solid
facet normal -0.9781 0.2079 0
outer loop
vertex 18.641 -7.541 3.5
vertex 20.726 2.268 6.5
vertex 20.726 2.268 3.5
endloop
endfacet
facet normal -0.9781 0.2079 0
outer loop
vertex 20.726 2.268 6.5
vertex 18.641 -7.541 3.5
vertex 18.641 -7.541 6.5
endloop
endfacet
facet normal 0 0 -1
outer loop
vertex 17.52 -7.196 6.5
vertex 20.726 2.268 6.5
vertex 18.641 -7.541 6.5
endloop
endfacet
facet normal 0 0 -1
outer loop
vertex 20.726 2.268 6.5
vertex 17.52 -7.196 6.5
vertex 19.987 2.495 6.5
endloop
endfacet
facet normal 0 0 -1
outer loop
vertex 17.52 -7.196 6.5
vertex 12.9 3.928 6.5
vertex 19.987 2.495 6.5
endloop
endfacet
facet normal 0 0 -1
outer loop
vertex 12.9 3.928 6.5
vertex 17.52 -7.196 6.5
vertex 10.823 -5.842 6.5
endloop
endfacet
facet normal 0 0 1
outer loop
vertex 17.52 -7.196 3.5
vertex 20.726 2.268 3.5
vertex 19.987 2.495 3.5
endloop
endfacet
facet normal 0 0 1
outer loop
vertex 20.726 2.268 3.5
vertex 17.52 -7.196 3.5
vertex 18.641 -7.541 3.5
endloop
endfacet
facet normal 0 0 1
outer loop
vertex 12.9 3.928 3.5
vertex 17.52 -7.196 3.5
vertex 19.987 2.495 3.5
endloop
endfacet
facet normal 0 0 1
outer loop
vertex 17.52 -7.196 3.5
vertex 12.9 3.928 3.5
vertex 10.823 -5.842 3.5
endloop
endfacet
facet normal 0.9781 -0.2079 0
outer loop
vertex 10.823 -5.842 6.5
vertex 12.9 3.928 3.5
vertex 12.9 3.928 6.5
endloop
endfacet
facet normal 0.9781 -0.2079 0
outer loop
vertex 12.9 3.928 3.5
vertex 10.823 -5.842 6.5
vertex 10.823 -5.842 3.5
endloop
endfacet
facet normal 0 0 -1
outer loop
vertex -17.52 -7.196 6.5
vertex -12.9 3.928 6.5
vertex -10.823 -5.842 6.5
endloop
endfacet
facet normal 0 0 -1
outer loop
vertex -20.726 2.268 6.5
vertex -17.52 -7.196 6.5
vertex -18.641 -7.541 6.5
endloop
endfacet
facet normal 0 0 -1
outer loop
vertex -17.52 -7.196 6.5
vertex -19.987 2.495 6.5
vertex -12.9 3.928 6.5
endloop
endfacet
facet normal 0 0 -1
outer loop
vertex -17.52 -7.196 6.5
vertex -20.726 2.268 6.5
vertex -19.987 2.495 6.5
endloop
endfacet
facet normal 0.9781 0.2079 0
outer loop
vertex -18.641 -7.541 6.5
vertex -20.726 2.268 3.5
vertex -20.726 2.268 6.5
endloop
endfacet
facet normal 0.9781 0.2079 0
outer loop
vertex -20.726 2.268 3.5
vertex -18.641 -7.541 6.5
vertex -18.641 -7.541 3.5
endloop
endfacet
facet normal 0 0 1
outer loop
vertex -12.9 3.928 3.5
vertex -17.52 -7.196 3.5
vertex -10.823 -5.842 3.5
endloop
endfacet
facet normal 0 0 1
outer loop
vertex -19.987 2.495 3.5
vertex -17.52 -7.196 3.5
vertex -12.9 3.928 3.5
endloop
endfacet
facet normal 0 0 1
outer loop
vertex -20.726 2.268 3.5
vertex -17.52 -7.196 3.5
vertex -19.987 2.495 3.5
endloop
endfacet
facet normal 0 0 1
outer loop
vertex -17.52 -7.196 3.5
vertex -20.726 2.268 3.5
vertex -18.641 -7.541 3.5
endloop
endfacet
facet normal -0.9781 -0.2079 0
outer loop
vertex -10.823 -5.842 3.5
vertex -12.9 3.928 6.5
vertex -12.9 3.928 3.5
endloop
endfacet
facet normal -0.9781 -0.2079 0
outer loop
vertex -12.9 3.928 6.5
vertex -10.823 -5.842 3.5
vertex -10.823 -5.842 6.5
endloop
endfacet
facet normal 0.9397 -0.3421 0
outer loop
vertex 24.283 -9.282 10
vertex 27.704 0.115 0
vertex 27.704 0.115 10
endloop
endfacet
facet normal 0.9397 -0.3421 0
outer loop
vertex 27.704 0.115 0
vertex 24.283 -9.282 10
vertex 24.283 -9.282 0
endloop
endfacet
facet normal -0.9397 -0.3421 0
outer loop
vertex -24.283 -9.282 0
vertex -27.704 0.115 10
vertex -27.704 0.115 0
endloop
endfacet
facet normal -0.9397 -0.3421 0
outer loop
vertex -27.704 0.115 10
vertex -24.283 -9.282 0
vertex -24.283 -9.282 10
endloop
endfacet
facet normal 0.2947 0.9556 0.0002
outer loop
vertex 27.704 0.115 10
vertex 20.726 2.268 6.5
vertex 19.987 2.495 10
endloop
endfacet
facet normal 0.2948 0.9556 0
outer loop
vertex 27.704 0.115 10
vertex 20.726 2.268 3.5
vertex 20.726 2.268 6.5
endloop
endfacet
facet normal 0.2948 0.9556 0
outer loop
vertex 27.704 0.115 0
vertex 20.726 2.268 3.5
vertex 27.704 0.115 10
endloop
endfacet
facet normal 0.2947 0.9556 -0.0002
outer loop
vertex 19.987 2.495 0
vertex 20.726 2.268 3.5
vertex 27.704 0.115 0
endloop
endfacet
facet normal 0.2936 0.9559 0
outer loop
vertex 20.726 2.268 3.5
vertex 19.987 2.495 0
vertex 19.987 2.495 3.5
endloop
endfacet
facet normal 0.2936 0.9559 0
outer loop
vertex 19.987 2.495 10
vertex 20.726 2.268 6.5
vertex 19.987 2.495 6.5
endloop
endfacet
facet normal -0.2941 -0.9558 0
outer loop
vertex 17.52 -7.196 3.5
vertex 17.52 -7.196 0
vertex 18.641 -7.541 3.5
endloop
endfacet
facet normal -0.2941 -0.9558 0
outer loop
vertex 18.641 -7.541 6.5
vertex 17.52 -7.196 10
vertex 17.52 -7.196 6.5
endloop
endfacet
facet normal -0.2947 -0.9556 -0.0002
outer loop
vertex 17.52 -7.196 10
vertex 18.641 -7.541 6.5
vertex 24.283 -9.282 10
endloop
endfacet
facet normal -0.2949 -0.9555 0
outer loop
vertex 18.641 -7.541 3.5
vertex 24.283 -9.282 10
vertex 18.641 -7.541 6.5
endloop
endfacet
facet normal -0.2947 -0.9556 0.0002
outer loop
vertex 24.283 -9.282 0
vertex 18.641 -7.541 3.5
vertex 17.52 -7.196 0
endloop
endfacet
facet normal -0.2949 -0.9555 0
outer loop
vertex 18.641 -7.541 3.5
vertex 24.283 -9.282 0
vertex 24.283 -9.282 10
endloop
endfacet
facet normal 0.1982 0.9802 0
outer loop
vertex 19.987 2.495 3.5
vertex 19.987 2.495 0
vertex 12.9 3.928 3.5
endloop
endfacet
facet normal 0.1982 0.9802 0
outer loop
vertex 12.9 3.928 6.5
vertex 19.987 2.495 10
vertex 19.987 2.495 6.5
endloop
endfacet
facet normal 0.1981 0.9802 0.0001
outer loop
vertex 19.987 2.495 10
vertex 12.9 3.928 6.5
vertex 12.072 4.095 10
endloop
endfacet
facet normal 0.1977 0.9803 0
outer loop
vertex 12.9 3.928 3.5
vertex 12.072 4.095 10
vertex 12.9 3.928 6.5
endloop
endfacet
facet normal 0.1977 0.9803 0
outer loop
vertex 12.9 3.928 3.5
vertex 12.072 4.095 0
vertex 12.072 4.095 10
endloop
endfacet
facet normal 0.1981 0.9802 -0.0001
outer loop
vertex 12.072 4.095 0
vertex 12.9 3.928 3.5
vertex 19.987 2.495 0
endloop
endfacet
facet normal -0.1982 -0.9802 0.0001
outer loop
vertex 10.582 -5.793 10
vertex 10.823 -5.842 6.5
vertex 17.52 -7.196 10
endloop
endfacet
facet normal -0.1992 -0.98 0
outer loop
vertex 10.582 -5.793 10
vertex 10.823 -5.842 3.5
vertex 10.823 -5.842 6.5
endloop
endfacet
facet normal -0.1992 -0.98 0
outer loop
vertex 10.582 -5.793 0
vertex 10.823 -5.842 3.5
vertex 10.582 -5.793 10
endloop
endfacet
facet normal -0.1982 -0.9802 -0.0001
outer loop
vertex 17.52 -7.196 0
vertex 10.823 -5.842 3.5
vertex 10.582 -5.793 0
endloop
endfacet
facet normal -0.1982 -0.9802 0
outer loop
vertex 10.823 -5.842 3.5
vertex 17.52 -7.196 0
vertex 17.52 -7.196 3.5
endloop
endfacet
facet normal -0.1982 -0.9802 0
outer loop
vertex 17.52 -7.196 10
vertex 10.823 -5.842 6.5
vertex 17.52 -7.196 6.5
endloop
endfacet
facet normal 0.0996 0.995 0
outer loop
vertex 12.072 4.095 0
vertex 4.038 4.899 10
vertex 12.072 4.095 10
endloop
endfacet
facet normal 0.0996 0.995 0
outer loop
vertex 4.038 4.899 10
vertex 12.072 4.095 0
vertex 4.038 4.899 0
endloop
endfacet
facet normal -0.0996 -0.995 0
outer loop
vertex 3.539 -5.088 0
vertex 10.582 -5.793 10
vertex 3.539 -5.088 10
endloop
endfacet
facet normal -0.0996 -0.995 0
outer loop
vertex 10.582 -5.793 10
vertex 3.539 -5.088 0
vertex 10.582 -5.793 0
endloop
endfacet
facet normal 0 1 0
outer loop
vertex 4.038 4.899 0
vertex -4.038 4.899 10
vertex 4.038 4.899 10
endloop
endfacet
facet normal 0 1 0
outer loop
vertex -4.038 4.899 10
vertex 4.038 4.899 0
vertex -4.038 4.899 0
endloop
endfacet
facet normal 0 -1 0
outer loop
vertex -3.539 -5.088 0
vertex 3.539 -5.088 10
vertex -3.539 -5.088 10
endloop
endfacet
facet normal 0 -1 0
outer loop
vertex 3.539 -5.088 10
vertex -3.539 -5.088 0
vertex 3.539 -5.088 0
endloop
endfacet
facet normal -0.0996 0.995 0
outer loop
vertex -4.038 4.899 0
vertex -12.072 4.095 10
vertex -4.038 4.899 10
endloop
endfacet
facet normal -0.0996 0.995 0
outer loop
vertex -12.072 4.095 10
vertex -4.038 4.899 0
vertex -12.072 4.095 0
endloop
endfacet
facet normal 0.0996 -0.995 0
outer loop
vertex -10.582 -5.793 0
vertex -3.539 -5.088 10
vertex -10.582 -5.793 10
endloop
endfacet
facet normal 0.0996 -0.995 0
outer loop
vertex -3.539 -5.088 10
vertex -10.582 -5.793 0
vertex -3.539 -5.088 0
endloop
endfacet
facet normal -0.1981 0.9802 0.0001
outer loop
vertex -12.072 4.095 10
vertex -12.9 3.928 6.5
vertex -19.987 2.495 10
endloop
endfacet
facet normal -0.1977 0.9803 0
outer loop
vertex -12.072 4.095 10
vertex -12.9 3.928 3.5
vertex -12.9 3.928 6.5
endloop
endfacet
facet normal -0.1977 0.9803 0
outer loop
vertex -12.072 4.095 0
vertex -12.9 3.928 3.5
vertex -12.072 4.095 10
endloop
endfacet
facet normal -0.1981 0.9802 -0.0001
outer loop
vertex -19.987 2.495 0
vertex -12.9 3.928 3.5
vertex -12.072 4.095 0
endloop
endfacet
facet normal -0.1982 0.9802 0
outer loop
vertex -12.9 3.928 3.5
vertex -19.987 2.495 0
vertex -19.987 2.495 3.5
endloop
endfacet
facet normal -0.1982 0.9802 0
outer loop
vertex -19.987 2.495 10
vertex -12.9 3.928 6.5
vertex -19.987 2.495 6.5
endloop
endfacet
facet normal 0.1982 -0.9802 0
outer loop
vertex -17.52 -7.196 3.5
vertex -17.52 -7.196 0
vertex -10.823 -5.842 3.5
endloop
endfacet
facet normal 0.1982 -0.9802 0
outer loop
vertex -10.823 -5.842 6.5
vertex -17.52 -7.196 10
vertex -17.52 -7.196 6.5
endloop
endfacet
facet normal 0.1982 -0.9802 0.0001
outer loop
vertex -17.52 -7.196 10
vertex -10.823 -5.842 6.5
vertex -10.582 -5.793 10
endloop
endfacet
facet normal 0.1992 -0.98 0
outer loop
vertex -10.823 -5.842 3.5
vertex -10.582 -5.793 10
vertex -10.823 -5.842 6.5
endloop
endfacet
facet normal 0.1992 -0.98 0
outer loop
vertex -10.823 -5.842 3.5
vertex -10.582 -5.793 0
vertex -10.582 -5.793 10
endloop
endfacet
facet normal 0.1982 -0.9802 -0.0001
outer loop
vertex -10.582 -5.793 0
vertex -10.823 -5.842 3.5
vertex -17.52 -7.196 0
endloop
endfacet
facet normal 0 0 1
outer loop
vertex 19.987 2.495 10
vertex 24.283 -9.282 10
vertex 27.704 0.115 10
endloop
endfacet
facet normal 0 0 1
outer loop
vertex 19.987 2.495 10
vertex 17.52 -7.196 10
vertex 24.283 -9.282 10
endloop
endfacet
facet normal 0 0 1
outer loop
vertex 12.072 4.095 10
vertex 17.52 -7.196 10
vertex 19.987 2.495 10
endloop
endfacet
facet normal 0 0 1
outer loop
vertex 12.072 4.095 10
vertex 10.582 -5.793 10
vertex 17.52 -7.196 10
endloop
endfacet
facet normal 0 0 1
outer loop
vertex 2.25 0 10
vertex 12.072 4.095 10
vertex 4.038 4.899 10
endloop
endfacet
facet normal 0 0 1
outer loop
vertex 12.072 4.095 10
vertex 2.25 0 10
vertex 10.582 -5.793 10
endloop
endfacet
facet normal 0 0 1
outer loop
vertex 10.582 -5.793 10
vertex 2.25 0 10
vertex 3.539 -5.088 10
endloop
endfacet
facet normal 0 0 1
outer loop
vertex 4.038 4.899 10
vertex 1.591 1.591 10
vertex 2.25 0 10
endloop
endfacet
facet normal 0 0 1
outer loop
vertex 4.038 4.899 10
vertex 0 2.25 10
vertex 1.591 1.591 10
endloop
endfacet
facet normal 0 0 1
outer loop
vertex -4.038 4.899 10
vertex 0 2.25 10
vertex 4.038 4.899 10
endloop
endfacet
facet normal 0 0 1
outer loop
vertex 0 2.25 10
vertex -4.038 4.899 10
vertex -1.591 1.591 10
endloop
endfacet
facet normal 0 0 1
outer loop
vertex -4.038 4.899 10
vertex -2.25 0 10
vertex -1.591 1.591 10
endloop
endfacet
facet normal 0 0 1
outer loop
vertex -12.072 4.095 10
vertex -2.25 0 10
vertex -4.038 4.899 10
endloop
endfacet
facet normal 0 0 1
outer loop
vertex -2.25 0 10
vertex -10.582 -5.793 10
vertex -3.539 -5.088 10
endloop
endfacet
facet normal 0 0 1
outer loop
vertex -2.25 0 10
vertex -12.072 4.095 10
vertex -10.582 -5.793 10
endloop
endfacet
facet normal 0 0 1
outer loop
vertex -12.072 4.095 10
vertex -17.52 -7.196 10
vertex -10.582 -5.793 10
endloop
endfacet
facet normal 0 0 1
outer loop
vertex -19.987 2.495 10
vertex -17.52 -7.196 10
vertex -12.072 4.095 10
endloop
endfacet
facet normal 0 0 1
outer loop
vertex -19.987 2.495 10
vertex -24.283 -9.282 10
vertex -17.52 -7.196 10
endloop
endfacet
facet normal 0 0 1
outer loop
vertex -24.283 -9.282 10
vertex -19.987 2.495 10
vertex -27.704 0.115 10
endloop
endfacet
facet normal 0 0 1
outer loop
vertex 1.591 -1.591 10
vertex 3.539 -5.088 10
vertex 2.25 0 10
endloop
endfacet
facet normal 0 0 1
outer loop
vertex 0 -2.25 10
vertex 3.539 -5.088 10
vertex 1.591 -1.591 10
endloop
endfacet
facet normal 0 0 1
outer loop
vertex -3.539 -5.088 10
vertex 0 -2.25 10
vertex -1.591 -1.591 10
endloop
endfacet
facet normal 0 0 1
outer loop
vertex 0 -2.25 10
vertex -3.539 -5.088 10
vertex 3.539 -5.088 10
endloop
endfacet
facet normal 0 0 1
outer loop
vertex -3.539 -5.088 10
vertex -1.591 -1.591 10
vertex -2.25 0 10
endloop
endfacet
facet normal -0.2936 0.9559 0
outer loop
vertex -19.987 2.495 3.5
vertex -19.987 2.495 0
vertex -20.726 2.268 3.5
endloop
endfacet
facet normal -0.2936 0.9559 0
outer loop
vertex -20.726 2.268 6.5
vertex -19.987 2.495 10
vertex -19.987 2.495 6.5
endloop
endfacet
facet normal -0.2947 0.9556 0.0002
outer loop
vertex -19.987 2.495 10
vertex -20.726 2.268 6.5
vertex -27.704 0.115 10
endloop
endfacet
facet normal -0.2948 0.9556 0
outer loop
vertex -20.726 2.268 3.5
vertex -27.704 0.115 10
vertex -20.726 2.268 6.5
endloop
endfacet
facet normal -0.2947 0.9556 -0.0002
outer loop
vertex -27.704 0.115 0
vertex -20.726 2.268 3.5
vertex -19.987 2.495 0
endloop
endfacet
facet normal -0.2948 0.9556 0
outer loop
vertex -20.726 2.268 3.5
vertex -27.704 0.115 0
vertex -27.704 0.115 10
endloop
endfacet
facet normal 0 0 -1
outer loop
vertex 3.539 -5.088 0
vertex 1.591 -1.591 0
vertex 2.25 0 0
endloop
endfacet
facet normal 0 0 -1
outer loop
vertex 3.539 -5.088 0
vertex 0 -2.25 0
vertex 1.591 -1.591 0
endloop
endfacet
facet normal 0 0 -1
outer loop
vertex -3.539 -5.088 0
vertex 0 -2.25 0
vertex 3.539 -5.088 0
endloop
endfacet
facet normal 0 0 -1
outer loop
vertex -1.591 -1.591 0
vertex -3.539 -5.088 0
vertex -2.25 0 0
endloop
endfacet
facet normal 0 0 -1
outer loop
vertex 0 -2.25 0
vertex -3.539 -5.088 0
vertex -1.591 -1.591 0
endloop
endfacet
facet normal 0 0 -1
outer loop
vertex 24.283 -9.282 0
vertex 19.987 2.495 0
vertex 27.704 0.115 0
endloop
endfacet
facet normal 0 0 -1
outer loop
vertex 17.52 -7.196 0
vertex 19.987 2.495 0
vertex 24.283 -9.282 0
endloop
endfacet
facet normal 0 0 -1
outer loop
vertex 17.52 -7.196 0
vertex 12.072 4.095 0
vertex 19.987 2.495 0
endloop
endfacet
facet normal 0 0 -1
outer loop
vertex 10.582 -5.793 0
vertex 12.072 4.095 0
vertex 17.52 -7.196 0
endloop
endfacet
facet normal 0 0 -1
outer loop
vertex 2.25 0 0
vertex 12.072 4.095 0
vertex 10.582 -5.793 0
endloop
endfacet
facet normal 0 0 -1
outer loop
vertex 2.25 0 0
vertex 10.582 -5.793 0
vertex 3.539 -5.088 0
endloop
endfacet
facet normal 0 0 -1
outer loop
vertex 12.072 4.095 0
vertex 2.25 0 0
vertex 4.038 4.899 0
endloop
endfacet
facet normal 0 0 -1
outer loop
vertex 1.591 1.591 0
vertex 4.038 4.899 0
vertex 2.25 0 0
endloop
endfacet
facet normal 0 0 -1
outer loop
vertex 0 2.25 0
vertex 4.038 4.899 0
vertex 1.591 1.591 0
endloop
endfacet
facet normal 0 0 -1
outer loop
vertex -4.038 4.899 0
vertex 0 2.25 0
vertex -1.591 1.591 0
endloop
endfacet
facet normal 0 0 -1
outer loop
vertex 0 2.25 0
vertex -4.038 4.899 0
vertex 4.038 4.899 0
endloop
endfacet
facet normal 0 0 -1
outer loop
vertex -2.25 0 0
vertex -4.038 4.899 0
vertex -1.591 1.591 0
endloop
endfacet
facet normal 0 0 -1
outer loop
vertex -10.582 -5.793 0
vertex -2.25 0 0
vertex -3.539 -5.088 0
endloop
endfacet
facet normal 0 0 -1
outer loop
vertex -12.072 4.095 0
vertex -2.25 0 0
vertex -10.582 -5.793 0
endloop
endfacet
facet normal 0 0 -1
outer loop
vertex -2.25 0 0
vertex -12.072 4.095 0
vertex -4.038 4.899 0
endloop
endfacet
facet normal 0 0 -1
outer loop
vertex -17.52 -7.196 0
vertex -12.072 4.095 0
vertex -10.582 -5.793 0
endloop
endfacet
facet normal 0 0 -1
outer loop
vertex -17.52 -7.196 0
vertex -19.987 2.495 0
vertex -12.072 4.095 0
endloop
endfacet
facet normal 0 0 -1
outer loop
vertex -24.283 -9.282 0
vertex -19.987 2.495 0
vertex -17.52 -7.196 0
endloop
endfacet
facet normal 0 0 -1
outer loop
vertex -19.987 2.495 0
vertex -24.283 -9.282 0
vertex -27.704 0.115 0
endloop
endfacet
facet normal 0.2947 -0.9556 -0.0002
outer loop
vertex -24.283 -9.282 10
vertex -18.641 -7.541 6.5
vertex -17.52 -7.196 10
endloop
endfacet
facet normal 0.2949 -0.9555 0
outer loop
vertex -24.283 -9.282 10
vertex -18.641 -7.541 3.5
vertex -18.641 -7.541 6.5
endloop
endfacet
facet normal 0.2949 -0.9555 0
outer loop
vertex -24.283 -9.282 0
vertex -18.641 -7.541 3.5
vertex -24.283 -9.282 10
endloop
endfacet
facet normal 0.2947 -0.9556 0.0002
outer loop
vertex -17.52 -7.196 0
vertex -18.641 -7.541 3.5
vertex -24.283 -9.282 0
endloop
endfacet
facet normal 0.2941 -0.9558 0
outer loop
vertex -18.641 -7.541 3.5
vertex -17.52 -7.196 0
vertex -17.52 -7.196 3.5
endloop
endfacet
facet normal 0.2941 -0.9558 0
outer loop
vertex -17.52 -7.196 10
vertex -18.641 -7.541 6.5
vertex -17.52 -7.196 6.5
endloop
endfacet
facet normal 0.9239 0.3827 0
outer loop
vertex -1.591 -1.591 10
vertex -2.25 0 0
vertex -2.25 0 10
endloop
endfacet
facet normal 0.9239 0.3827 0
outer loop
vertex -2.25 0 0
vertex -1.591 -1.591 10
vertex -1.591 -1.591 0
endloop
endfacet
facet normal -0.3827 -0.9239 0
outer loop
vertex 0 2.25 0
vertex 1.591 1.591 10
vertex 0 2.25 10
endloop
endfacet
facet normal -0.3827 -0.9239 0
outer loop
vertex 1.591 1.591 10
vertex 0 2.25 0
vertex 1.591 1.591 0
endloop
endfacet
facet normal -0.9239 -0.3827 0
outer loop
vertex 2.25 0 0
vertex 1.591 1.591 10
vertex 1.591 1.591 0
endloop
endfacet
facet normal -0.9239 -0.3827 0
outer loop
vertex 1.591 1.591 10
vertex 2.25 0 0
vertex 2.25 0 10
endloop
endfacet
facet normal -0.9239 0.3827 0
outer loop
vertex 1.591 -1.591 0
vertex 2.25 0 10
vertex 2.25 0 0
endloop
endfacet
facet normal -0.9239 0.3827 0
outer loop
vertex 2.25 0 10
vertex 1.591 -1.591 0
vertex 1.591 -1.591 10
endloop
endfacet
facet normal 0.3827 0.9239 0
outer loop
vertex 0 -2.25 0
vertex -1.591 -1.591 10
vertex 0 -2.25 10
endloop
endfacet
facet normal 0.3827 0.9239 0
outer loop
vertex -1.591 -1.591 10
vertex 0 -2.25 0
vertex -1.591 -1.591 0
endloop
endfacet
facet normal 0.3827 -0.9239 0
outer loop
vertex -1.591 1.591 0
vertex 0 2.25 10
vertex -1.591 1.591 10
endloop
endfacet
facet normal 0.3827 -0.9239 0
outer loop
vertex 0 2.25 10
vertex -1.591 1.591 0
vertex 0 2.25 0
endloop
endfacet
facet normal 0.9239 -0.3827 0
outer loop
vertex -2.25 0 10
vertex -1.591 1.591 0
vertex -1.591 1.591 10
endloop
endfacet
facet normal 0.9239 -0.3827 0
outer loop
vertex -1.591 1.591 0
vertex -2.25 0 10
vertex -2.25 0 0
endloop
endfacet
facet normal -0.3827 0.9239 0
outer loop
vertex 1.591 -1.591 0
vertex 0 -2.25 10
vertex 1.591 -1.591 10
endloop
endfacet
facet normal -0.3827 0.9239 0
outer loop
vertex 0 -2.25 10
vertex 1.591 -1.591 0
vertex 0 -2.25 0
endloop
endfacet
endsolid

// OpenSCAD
// file: dimensions.scad
internal_height = 60;

plate_width = 280;
plate_vertex_radius = 15;

pillar_offset = (plate_width / 2) - 12;
side_panel_offset = 124.5;

top_plate_thickness = 3;
bottom_plate_thickness = 5;
side_panel_thickness = 3;

side_panel_width = 94;
side_panel_tab_width = 15;
side_panel_tab_offset = 40;

card_reader_spacer_thickness = 1.5;
card_reader_offset = 70;
card_reader_mounting_holes = [[0, 0], [-7, 20], [7, 20]];

control_board_spacer_thickness = 3;
control_board_offset = (70 / 2) - 5;
control_board_mounting_holes = [[-38 / 2, 0], [38 / 2, 0]];

led_ring_mount_offset = 152 / 2;
// main file
include <dimensions.scad>;

module LedRingMount3D() {
    r1 = 142 / 2;
    r2 = 162 / 2;
    w = r2 - r1;
    h = 10;
    a1 = 40;

    difference() {
        translate([0, -r1 - (w / 2), 0]) {
            difference() {
                // Main body
                rotate(90 + (-a1 / 2)) {
                    rotate_extrude(angle = a1, $fn = 64) {
                        translate([r1, 0]) {
                            square([w, h]);
                        }
                    }
                }

                // LED mount pin holes
                for(a = [-12, 12]) {
                    rotate(a) {
                        translate([0, r1 + (w / 2), h / 2]) {
                            cube([8, w + 2, 3], center = true);
                        }
                    }
                }
            }
        }

        // Mounting hole (for M3 brass insert)
        translate([0, 0, -0.01]) {
            cylinder(h = h + 0.02, d = 4.5, $fn = 8);
        }
    }
}

LedRingMount3D();
